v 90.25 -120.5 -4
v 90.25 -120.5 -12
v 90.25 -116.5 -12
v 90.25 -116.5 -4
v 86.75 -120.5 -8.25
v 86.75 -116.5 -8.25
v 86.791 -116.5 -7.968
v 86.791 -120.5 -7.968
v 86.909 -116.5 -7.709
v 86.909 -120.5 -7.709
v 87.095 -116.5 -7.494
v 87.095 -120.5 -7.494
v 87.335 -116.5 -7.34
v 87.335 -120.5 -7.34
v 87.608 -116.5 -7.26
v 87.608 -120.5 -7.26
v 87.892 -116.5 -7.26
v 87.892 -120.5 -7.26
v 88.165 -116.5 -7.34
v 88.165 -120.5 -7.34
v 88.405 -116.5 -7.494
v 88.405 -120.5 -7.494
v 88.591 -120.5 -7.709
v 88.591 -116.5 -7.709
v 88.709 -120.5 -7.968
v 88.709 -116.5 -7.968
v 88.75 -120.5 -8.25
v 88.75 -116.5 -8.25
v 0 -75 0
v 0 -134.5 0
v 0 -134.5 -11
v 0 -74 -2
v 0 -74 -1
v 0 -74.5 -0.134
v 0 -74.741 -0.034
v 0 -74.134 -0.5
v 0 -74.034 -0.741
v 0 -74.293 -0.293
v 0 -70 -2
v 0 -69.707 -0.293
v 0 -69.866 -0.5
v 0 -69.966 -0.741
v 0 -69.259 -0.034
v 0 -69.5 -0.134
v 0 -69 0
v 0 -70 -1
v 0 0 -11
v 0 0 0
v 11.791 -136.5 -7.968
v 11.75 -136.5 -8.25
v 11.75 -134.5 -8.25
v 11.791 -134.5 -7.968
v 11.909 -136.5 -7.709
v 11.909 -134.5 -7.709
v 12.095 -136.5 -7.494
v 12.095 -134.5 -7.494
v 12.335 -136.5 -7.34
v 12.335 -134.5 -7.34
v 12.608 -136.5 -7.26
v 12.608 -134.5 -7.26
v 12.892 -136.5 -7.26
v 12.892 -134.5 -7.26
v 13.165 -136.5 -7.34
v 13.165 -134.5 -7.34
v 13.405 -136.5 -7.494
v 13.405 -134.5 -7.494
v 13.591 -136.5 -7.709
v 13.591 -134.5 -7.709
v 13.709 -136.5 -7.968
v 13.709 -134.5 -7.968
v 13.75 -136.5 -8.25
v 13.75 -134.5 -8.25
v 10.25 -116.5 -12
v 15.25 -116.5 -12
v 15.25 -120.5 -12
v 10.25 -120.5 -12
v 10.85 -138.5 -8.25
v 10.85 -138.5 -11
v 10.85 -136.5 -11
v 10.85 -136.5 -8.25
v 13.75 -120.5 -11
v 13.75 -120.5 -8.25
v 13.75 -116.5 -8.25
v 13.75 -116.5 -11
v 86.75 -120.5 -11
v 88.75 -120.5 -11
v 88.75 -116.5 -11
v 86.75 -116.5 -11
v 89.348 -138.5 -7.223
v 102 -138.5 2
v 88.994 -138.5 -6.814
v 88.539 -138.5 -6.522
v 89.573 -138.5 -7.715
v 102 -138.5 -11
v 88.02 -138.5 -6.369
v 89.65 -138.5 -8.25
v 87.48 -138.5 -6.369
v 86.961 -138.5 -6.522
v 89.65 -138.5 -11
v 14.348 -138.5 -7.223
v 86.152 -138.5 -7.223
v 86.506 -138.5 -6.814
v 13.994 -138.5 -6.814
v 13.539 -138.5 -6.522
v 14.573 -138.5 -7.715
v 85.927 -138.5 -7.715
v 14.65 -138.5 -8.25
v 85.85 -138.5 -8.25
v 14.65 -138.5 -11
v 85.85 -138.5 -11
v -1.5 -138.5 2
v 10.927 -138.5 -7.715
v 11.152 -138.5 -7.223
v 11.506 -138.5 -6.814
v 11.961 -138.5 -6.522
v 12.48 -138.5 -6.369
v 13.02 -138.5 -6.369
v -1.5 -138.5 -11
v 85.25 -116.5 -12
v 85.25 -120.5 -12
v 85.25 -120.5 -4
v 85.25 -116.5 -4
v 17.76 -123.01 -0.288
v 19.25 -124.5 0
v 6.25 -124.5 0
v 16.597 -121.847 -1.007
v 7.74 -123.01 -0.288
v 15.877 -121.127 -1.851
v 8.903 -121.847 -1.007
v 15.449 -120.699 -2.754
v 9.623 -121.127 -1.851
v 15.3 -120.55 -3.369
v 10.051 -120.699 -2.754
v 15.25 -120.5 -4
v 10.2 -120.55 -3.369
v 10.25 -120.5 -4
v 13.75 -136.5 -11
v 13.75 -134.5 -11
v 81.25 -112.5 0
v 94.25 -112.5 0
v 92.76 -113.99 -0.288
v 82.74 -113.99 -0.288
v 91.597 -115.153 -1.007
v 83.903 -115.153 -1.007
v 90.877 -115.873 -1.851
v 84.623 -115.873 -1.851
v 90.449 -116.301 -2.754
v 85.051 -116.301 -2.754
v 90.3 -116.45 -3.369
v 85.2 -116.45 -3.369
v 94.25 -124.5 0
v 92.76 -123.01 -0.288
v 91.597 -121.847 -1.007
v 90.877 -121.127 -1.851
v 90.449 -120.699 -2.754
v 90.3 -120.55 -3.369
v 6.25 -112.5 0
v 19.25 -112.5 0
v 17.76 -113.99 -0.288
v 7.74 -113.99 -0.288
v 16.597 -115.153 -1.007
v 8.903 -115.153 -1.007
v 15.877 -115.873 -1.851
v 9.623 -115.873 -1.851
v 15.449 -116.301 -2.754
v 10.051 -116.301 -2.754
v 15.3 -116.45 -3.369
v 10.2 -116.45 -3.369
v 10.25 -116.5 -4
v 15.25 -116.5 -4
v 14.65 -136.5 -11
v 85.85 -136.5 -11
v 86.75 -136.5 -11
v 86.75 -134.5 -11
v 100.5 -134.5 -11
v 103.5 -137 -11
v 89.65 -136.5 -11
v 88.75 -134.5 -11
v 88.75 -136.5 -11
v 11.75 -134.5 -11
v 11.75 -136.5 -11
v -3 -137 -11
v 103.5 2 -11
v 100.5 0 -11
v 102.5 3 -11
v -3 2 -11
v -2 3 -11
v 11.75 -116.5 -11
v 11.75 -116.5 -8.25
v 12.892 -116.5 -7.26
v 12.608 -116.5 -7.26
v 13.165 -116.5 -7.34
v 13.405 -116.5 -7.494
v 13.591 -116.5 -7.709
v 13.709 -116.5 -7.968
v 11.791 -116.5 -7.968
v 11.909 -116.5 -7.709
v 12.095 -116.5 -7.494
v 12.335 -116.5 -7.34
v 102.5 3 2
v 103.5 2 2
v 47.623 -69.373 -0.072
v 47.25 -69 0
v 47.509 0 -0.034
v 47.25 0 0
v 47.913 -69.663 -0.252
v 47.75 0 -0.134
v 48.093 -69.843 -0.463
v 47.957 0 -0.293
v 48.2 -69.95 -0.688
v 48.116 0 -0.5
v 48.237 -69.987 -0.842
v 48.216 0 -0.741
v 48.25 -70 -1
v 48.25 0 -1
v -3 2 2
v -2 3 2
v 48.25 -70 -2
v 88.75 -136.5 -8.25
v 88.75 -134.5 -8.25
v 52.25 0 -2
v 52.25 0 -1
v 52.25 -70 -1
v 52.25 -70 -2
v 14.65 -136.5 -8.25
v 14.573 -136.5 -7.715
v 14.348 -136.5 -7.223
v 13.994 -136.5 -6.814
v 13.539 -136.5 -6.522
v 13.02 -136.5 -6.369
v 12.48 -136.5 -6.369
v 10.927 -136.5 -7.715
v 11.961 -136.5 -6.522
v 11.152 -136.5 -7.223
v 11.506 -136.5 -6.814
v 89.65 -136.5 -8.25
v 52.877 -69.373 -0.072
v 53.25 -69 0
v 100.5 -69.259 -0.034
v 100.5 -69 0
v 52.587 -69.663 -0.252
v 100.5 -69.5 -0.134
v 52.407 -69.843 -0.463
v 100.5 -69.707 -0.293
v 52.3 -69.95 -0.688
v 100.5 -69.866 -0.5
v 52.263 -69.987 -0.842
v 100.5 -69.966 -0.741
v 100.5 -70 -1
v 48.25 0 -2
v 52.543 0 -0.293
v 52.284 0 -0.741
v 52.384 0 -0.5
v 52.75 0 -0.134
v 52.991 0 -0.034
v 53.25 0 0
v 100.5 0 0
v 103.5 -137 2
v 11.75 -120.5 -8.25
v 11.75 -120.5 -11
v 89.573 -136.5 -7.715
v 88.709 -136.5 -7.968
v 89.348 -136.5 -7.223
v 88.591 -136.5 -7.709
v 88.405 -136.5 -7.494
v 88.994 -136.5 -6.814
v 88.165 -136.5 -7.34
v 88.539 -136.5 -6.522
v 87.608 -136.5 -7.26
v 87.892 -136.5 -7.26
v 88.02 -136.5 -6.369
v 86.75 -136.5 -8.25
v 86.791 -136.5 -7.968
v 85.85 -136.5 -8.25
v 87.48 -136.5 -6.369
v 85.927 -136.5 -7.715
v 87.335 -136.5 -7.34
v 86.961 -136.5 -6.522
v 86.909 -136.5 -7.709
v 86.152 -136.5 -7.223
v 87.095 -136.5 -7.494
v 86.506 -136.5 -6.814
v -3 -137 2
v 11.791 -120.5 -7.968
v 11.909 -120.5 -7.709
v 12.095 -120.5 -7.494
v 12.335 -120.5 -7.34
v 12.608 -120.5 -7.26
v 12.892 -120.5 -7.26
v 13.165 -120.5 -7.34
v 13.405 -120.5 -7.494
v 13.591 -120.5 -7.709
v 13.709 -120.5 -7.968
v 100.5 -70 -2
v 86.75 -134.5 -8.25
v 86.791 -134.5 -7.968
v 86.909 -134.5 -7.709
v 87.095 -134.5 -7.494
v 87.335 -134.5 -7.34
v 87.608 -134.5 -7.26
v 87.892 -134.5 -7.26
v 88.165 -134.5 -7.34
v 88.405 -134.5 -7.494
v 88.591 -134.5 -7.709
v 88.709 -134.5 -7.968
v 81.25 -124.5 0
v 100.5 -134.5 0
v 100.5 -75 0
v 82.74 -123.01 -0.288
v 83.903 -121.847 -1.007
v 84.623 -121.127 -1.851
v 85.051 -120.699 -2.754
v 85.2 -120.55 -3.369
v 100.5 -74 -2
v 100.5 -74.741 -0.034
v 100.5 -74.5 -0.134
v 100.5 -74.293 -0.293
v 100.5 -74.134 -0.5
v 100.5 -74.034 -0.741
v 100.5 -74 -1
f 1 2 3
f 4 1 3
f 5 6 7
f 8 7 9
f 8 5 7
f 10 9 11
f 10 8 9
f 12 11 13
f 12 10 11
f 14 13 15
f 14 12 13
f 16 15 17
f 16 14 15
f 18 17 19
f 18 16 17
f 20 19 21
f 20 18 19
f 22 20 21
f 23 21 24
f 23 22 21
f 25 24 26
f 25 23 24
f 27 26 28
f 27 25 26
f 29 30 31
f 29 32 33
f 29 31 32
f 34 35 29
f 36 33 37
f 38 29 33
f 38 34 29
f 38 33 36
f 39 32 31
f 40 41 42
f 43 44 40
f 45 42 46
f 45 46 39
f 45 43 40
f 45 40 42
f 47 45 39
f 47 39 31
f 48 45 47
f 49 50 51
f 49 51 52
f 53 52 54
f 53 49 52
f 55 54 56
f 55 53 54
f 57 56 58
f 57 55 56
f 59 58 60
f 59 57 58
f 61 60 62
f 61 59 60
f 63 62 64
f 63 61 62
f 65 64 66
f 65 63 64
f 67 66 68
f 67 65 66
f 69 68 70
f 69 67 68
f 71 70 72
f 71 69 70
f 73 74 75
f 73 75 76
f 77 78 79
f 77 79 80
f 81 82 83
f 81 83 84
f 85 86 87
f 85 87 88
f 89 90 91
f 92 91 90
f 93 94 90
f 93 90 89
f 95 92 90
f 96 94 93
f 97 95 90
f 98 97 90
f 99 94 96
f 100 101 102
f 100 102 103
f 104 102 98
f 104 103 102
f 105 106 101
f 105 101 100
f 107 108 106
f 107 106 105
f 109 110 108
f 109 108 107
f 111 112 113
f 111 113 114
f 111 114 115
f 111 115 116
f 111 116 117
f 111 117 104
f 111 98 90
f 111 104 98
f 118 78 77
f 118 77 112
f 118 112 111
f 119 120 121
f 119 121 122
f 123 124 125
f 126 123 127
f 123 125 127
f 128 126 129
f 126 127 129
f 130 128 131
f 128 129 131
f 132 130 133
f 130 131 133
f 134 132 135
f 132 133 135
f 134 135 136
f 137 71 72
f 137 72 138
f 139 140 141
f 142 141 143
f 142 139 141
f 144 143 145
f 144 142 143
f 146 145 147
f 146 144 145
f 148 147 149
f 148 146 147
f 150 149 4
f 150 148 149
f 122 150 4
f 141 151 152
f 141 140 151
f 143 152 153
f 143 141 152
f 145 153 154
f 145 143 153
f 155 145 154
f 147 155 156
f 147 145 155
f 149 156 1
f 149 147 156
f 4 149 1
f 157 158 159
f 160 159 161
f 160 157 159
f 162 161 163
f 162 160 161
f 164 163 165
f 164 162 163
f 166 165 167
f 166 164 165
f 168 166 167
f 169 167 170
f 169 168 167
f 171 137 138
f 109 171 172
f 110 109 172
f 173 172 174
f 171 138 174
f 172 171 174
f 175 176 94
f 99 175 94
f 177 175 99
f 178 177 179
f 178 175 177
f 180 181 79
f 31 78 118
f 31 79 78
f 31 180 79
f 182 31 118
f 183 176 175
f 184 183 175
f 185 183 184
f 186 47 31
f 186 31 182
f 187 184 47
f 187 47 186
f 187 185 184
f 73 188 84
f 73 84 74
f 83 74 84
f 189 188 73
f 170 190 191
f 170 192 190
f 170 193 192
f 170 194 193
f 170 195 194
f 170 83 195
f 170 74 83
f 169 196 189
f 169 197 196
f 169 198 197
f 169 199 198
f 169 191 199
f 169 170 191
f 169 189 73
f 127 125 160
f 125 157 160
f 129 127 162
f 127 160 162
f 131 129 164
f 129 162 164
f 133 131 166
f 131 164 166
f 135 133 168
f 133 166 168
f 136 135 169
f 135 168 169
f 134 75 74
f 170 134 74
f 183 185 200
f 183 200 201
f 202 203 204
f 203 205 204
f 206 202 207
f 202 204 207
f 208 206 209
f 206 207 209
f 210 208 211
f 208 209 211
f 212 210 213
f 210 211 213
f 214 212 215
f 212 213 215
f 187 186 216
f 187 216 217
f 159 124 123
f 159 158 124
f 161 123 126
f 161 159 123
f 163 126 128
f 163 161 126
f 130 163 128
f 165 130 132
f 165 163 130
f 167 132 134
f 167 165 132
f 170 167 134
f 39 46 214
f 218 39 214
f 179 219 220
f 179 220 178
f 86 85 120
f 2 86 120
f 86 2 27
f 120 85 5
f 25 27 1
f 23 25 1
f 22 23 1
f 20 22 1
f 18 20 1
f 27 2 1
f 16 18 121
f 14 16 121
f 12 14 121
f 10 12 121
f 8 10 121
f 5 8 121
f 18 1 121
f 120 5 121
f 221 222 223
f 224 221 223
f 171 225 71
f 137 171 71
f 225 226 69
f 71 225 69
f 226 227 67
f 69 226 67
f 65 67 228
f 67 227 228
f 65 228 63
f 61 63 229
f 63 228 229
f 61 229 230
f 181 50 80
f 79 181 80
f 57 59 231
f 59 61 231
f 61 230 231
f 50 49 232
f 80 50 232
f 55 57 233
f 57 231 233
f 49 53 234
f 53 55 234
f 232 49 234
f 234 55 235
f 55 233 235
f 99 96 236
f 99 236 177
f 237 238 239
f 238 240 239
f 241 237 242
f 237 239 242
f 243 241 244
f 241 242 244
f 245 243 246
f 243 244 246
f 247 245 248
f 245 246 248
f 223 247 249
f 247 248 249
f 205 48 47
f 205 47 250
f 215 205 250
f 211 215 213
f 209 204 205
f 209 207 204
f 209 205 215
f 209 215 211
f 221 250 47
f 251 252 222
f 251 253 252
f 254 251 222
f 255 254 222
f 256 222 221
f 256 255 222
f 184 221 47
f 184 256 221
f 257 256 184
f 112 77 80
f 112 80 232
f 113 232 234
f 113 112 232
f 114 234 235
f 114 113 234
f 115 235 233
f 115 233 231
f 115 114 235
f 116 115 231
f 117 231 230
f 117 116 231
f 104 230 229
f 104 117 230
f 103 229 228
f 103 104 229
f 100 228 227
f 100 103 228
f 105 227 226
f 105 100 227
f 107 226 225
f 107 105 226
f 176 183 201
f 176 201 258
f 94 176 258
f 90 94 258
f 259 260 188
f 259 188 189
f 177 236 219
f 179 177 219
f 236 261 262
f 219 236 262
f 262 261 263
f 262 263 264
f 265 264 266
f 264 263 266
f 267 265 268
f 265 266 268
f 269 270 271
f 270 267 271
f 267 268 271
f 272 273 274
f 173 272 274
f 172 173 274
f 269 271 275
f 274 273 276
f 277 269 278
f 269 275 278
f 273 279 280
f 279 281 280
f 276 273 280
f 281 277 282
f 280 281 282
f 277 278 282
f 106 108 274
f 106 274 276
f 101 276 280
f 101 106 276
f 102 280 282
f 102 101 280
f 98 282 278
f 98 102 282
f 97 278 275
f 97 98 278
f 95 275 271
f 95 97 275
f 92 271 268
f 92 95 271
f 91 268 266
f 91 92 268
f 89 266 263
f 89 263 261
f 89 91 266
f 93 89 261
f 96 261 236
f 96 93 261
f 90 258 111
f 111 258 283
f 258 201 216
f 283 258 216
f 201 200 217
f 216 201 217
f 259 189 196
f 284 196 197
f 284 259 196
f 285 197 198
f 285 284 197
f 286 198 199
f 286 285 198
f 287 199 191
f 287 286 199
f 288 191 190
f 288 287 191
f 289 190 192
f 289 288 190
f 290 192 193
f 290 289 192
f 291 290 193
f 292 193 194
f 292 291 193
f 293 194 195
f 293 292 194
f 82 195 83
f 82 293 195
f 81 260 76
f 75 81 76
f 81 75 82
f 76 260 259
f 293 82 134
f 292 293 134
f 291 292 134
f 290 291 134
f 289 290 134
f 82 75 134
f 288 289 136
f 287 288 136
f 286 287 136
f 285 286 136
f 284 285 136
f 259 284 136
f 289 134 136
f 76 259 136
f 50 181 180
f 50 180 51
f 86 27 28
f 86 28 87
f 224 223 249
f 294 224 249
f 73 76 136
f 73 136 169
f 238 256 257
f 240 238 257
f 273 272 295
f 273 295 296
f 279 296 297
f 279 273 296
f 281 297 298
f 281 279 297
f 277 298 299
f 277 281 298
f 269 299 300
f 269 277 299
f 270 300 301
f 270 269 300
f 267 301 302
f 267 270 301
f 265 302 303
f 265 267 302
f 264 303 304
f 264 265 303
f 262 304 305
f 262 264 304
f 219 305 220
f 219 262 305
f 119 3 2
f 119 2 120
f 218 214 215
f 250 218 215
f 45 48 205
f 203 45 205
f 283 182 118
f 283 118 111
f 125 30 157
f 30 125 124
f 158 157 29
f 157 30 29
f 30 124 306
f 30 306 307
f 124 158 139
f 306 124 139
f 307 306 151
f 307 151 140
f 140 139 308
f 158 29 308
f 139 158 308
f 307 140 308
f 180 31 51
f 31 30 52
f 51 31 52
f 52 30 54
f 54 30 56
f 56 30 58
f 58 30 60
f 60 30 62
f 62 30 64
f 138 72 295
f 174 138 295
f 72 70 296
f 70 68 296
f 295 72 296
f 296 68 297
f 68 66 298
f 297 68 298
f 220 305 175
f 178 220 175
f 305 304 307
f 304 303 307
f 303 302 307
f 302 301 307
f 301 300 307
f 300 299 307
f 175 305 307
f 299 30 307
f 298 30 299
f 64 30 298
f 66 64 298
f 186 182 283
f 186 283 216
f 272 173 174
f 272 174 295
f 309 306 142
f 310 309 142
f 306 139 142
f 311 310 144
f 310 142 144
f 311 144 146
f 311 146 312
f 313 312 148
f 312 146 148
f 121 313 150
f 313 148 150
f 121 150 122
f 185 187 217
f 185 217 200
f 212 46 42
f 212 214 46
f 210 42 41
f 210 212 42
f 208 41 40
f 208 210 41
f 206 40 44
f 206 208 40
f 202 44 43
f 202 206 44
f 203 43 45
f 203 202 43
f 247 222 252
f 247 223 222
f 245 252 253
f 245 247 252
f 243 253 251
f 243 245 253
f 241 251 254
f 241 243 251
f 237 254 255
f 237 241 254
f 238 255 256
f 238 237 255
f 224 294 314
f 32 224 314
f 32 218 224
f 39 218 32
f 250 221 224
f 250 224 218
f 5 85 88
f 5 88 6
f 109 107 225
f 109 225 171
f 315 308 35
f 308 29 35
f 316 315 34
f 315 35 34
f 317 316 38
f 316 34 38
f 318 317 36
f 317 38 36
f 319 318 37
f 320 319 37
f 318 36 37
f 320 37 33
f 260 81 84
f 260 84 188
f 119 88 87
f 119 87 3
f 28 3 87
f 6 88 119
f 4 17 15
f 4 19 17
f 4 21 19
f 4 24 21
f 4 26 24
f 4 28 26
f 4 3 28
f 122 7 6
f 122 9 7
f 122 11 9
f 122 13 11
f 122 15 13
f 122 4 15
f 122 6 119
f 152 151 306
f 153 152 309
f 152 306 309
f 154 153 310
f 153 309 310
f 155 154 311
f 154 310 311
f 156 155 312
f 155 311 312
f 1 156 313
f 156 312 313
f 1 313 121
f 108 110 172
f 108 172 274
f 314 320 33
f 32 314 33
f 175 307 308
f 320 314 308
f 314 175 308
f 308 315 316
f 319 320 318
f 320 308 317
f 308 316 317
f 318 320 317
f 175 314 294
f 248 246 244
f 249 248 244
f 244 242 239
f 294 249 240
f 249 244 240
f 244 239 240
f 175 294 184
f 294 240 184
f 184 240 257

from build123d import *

# Parameters (mm, degrees)
SKETCH1_W           = 100.5
SKETCH1_H           = 134.5
BOSS_EXTRUDE1_DEPTH = 2
SKETCH2_W           = 104.5
SKETCH2_H           = 138.5
SKETCH2_W_2         = 100.5
SKETCH2_H_2         = 134.5
BOSS_EXTRUDE2_DEPTH = 13
BOSS_EXTRUDE3_DEPTH = 2
SKETCH5_W           = 104.5
SKETCH5_H           = 13
BOSS_EXTRUDE4_DEPTH = 2
CUT_EXTRUDE2_DEPTH  = 2
SKETCH8_W           = 5
SKETCH8_H           = 4
BOSS_EXTRUDE5_DEPTH = 12
FILLET1_R           = 4
CUT_EXTRUDE3_DEPTH  = 20
BOSS_EXTRUDE7_DEPTH = 13
CHAMFER1_SIZE       = 1.5
FILLET2_R           = 1


with BuildPart() as part:
    # Sketch1 → Boss-Extrude1 (new body)
    with BuildSketch(Plane.XY):
        with Locations((50.25, -67.25)):
            Rectangle(SKETCH1_W, SKETCH1_H)
    extrude(amount=BOSS_EXTRUDE1_DEPTH)

    # Sketch2 → Boss-Extrude2 (add)
    with BuildSketch(Plane.XY.offset(2)):
        with Locations((50.25, -67.25)):
            Rectangle(SKETCH2_W, SKETCH2_H)
        with Locations((50.25, -67.25)):
            Rectangle(SKETCH2_W_2, SKETCH2_H_2, mode=Mode.SUBTRACT)
    extrude(amount=-BOSS_EXTRUDE2_DEPTH)

    # Sketch3 → Boss-Extrude3 (add)
    with BuildSketch(Plane(origin=(0, 0, 0), x_dir=(-1, 0, 0), z_dir=(0, 0, -1))):
        Polygon((-52.25, 0), (-52.25, -70), (-101.125, -70), (-101.125, -74), (0.625, -74), (0.625, -70), (-48.25, -70), (-48.25, 0), align=None)
    extrude(amount=BOSS_EXTRUDE3_DEPTH)

    # Sketch5 → Boss-Extrude4 (add)
    with BuildSketch(Plane.XZ.offset(136.5)):
        with Locations((50.25, -4.5)):
            Rectangle(SKETCH5_W, SKETCH5_H)
    extrude(amount=BOSS_EXTRUDE4_DEPTH)

    # Sketch4 → Cut-Extrude2 (cut)
    with BuildSketch(Plane.XZ.offset(138.5)):
        with BuildLine():
            Line((89.65, -8.25), (89.65, -11))
            Line((89.65, -11), (85.85, -11))
            Line((85.85, -11), (85.85, -8.25))
            ThreePointArc((85.85, -8.25), (87.75, -6.35), (89.65, -8.25))
        make_face()
        with BuildLine():
            Line((14.65, -8.25), (14.65, -11))
            Line((14.65, -11), (10.85, -11))
            Line((10.85, -11), (10.85, -8.25))
            ThreePointArc((10.85, -8.25), (12.75, -6.35), (14.65, -8.25))
        make_face()
    extrude(amount=-CUT_EXTRUDE2_DEPTH, mode=Mode.SUBTRACT)

    # Sketch8 → Boss-Extrude5 (add)
    with BuildSketch(Plane(origin=(0, 0, 0), x_dir=(-1, 0, 0), z_dir=(0, 0, -1))):
        with Locations((-12.75, -118.5)):
            Rectangle(SKETCH8_W, SKETCH8_H)
        with Locations((-87.75, -118.5)):
            Rectangle(SKETCH8_W, SKETCH8_H)
    extrude(amount=BOSS_EXTRUDE5_DEPTH)

    # Fillet1
    fillet1_edges = [part.edges().sort_by_distance(p)[0] for p in [
        (10.25, -118.5, 0),
        (12.75, -116.5, 0),
        (15.25, -118.5, 0),
        (12.75, -120.5, 0),
        (85.25, -118.5, 0),
        (87.75, -116.5, 0),
        (90.25, -118.5, 0),
        (87.75, -120.5, 0),
    ]]
    fillet(fillet1_edges, radius=FILLET1_R)

    # Sketch7 → Cut-Extrude3 (cut)
    with BuildSketch(Plane.XZ.offset(136.5)):
        with BuildLine():
            Line((88.75, -8.25), (88.75, -11))
            Line((88.75, -11), (86.75, -11))
            Line((86.75, -11), (86.75, -8.25))
            ThreePointArc((86.75, -8.25), (87.75, -7.25), (88.75, -8.25))
        make_face()
        with BuildLine():
            Line((13.75, -8.25), (13.75, -11))
            Line((13.75, -11), (11.75, -11))
            Line((11.75, -11), (11.75, -8.25))
            ThreePointArc((11.75, -8.25), (12.75, -7.25), (13.75, -8.25))
        make_face()
    extrude(amount=-CUT_EXTRUDE3_DEPTH, mode=Mode.SUBTRACT)

    # Sketch13 → Boss-Extrude7 (add)
    with BuildSketch(Plane(origin=(0, 0, -11), x_dir=(-1, 0, 0), z_dir=(0, 0, -1))):
        Polygon((2, -138.5), (3, -138.5), (3, 2), (2, 3), (-102.5, 3), (-103.5, 2), (-103.5, -138.5), (-102.5, -138.5), (-102.5, 2), (2, 2), align=None)
    extrude(amount=-BOSS_EXTRUDE7_DEPTH)

    # Chamfer1
    chamfer1_edges = [part.edges().sort_by_distance(p)[0] for p in [
        (-3, -138.5, -4.5),
        (103.5, -138.5, -4.5),
    ]]
    chamfer(chamfer1_edges, length=CHAMFER1_SIZE)

    # Fillet2
    fillet2_edges = [part.edges().sort_by_distance(p)[0] for p in [
        (76.375, -70, 0),
        (50.25, -74, 0),
        (48.25, -35, 0),
        (24.125, -70, 0),
        (52.25, -35, 0),
    ]]
    fillet(fillet2_edges, radius=FILLET2_R)


solid = part.part
